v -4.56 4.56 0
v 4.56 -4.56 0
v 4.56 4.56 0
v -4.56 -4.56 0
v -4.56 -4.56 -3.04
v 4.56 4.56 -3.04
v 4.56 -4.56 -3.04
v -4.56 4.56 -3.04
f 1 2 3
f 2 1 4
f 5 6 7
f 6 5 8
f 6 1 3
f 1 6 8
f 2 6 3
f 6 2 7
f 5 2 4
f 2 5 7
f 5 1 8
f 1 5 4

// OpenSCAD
// file: ../p/box.scad
use <../lib.scad>
function ldraw_lib__box() = [
// 0 Box 6 (six faces)
// 0 Name: box.dat
// 0 Author: James Jessiman
// 0 !LDRAW_ORG Primitive UPDATE 2002-05
// 0 !LICENSE Licensed under CC BY 2.0 and CC BY 4.0 : see CAreadme.txt
// 
// 0 BFC CERTIFY CCW
  [0,"BFC","CERTIFY"],
  [0,"BFC","CCW"],
// 
// 0 !HISTORY 2002-08-22 [sbliss] Applied BFC
// 0 !HISTORY 2002-11-30 [PTadmin] Official Update 2002-05
// 0 !HISTORY 2007-06-24 [PTadmin] Header formatted for Contributor Agreement
// 0 !HISTORY 2008-07-01 [PTadmin] Official Update 2008-01
// 
// 
// 2 24 1 1 1 -1 1 1
  [2,24,1,1,1,-1,1,1],
// 2 24 -1 1 1 -1 1 -1
  [2,24,-1,1,1,-1,1,-1],
// 2 24 -1 1 -1 1 1 -1
  [2,24,-1,1,-1,1,1,-1],
// 2 24 1 1 -1 1 1 1
  [2,24,1,1,-1,1,1,1],
// 2 24 1 -1 1 -1 -1 1
  [2,24,1,-1,1,-1,-1,1],
// 2 24 -1 -1 1 -1 -1 -1
  [2,24,-1,-1,1,-1,-1,-1],
// 2 24 -1 -1 -1 1 -1 -1
  [2,24,-1,-1,-1,1,-1,-1],
// 2 24 1 -1 -1 1 -1 1
  [2,24,1,-1,-1,1,-1,1],
// 2 24 1 -1 1 1 1 1
  [2,24,1,-1,1,1,1,1],
// 2 24 -1 -1 1 -1 1 1
  [2,24,-1,-1,1,-1,1,1],
// 2 24 1 -1 -1 1 1 -1
  [2,24,1,-1,-1,1,1,-1],
// 2 24 -1 -1 -1 -1 1 -1
  [2,24,-1,-1,-1,-1,1,-1],
// 4 16 1 1 1 1 1 -1 -1 1 -1 -1 1 1
  [4,16,1,1,1,1,1,-1,-1,1,-1,-1,1,1],
// 4 16 -1 -1 -1 1 -1 -1 1 -1 1 -1 -1 1
  [4,16,-1,-1,-1,1,-1,-1,1,-1,1,-1,-1,1],
// 4 16 -1 -1 1 1 -1 1 1 1 1 -1 1 1
  [4,16,-1,-1,1,1,-1,1,1,1,1,-1,1,1],
// 4 16 -1 -1 -1 -1 -1 1 -1 1 1 -1 1 -1
  [4,16,-1,-1,-1,-1,-1,1,-1,1,1,-1,1,-1],
// 4 16 1 -1 -1 -1 -1 -1 -1 1 -1 1 1 -1
  [4,16,1,-1,-1,-1,-1,-1,-1,1,-1,1,1,-1],
// 4 16 1 -1 1 1 -1 -1 1 1 -1 1 1 1
  [4,16,1,-1,1,1,-1,-1,1,1,-1,1,1,1],
// 0
];
module ldraw_lib__box(step=0, col=false, unit=2/5, alt=false, line=0.2, solid=!$preview)
    makepoly(ldraw_lib__box(), step=step, col=col, unit=unit, alt=alt, line=line, solid=solid);
ldraw_lib__box(line=0.2);
// file: 70591.scad
use <../lib.scad>
use <../p/box.scad>
function ldraw_lib__70591() = [
// 0 ~Technic Control Centre - Rubber Foot
// 0 Name: 70591.dat
// 0 Author: Steffen [Steffen]
// 0 !LDRAW_ORG Part UPDATE 2019-02
// 0 !LICENSE Licensed under CC BY 2.0 and CC BY 4.0 : see CAreadme.txt
// 
// 0 BFC CERTIFY CW
  [0,"BFC","CERTIFY"],
  [0,"BFC","CW"],
// 
// 0 !CATEGORY Electric
// 
// 0 !CMDLINE -c511
// 
// 0 !HISTORY 2012-03-30 [PTadmin] Official Update 2012-01
// 0 !HISTORY 2018-10-27 [PTadmin] Renamed from u9227
// 0 !HISTORY 2019-09-09 [PTadmin] Official Update 2019-02
// 
// 
// 1 16 0 3.8 0 -11.4 0 0 0 -3.8 0 0 0 11.4 box.dat
  [1,16,0,3.8,0,-11.4,0,0,0,-3.8,0,0,0,11.4, ldraw_lib__box()],
];
module ldraw_lib__70591(step=0, col=false, unit=2/5, alt=false, line=0.2, solid=!$preview)
    makepoly(ldraw_lib__70591(), step=step, col=col, unit=unit, alt=alt, line=line, solid=solid);
ldraw_lib__70591(line=0.2);
// main file
use <../lib.scad>
use <70591.scad>
function ldraw_lib__u9227() = [
// 0 ~Moved to 70591
// 0 Name: u9227.dat
// 0 Author: [PTadmin]
// 0 !LDRAW_ORG Part UPDATE 2019-02
// 0 !LICENSE Licensed under CC BY 4.0 : see CAreadme.txt
// 
// 0 BFC CERTIFY CCW
  [0,"BFC","CERTIFY"],
  [0,"BFC","CCW"],
// 
// 0 !HISTORY 2019-09-09 [PTadmin] Official Update 2019-02
// 
// 
// 0 // ~Technic Control Centre - Rubber Foot
// 1 16 0 0 0 1 0 0 0 1 0 0 0 1 70591.dat
  [1,16,0,0,0,1,0,0,0,1,0,0,0,1, ldraw_lib__70591()],
];
module ldraw_lib__u9227(step=0, col=false, unit=2/5, alt=false, line=0.2, solid=!$preview)
    makepoly(ldraw_lib__u9227(), step=step, col=col, unit=unit, alt=alt, line=line, solid=solid);
ldraw_lib__u9227(line=0.2);
